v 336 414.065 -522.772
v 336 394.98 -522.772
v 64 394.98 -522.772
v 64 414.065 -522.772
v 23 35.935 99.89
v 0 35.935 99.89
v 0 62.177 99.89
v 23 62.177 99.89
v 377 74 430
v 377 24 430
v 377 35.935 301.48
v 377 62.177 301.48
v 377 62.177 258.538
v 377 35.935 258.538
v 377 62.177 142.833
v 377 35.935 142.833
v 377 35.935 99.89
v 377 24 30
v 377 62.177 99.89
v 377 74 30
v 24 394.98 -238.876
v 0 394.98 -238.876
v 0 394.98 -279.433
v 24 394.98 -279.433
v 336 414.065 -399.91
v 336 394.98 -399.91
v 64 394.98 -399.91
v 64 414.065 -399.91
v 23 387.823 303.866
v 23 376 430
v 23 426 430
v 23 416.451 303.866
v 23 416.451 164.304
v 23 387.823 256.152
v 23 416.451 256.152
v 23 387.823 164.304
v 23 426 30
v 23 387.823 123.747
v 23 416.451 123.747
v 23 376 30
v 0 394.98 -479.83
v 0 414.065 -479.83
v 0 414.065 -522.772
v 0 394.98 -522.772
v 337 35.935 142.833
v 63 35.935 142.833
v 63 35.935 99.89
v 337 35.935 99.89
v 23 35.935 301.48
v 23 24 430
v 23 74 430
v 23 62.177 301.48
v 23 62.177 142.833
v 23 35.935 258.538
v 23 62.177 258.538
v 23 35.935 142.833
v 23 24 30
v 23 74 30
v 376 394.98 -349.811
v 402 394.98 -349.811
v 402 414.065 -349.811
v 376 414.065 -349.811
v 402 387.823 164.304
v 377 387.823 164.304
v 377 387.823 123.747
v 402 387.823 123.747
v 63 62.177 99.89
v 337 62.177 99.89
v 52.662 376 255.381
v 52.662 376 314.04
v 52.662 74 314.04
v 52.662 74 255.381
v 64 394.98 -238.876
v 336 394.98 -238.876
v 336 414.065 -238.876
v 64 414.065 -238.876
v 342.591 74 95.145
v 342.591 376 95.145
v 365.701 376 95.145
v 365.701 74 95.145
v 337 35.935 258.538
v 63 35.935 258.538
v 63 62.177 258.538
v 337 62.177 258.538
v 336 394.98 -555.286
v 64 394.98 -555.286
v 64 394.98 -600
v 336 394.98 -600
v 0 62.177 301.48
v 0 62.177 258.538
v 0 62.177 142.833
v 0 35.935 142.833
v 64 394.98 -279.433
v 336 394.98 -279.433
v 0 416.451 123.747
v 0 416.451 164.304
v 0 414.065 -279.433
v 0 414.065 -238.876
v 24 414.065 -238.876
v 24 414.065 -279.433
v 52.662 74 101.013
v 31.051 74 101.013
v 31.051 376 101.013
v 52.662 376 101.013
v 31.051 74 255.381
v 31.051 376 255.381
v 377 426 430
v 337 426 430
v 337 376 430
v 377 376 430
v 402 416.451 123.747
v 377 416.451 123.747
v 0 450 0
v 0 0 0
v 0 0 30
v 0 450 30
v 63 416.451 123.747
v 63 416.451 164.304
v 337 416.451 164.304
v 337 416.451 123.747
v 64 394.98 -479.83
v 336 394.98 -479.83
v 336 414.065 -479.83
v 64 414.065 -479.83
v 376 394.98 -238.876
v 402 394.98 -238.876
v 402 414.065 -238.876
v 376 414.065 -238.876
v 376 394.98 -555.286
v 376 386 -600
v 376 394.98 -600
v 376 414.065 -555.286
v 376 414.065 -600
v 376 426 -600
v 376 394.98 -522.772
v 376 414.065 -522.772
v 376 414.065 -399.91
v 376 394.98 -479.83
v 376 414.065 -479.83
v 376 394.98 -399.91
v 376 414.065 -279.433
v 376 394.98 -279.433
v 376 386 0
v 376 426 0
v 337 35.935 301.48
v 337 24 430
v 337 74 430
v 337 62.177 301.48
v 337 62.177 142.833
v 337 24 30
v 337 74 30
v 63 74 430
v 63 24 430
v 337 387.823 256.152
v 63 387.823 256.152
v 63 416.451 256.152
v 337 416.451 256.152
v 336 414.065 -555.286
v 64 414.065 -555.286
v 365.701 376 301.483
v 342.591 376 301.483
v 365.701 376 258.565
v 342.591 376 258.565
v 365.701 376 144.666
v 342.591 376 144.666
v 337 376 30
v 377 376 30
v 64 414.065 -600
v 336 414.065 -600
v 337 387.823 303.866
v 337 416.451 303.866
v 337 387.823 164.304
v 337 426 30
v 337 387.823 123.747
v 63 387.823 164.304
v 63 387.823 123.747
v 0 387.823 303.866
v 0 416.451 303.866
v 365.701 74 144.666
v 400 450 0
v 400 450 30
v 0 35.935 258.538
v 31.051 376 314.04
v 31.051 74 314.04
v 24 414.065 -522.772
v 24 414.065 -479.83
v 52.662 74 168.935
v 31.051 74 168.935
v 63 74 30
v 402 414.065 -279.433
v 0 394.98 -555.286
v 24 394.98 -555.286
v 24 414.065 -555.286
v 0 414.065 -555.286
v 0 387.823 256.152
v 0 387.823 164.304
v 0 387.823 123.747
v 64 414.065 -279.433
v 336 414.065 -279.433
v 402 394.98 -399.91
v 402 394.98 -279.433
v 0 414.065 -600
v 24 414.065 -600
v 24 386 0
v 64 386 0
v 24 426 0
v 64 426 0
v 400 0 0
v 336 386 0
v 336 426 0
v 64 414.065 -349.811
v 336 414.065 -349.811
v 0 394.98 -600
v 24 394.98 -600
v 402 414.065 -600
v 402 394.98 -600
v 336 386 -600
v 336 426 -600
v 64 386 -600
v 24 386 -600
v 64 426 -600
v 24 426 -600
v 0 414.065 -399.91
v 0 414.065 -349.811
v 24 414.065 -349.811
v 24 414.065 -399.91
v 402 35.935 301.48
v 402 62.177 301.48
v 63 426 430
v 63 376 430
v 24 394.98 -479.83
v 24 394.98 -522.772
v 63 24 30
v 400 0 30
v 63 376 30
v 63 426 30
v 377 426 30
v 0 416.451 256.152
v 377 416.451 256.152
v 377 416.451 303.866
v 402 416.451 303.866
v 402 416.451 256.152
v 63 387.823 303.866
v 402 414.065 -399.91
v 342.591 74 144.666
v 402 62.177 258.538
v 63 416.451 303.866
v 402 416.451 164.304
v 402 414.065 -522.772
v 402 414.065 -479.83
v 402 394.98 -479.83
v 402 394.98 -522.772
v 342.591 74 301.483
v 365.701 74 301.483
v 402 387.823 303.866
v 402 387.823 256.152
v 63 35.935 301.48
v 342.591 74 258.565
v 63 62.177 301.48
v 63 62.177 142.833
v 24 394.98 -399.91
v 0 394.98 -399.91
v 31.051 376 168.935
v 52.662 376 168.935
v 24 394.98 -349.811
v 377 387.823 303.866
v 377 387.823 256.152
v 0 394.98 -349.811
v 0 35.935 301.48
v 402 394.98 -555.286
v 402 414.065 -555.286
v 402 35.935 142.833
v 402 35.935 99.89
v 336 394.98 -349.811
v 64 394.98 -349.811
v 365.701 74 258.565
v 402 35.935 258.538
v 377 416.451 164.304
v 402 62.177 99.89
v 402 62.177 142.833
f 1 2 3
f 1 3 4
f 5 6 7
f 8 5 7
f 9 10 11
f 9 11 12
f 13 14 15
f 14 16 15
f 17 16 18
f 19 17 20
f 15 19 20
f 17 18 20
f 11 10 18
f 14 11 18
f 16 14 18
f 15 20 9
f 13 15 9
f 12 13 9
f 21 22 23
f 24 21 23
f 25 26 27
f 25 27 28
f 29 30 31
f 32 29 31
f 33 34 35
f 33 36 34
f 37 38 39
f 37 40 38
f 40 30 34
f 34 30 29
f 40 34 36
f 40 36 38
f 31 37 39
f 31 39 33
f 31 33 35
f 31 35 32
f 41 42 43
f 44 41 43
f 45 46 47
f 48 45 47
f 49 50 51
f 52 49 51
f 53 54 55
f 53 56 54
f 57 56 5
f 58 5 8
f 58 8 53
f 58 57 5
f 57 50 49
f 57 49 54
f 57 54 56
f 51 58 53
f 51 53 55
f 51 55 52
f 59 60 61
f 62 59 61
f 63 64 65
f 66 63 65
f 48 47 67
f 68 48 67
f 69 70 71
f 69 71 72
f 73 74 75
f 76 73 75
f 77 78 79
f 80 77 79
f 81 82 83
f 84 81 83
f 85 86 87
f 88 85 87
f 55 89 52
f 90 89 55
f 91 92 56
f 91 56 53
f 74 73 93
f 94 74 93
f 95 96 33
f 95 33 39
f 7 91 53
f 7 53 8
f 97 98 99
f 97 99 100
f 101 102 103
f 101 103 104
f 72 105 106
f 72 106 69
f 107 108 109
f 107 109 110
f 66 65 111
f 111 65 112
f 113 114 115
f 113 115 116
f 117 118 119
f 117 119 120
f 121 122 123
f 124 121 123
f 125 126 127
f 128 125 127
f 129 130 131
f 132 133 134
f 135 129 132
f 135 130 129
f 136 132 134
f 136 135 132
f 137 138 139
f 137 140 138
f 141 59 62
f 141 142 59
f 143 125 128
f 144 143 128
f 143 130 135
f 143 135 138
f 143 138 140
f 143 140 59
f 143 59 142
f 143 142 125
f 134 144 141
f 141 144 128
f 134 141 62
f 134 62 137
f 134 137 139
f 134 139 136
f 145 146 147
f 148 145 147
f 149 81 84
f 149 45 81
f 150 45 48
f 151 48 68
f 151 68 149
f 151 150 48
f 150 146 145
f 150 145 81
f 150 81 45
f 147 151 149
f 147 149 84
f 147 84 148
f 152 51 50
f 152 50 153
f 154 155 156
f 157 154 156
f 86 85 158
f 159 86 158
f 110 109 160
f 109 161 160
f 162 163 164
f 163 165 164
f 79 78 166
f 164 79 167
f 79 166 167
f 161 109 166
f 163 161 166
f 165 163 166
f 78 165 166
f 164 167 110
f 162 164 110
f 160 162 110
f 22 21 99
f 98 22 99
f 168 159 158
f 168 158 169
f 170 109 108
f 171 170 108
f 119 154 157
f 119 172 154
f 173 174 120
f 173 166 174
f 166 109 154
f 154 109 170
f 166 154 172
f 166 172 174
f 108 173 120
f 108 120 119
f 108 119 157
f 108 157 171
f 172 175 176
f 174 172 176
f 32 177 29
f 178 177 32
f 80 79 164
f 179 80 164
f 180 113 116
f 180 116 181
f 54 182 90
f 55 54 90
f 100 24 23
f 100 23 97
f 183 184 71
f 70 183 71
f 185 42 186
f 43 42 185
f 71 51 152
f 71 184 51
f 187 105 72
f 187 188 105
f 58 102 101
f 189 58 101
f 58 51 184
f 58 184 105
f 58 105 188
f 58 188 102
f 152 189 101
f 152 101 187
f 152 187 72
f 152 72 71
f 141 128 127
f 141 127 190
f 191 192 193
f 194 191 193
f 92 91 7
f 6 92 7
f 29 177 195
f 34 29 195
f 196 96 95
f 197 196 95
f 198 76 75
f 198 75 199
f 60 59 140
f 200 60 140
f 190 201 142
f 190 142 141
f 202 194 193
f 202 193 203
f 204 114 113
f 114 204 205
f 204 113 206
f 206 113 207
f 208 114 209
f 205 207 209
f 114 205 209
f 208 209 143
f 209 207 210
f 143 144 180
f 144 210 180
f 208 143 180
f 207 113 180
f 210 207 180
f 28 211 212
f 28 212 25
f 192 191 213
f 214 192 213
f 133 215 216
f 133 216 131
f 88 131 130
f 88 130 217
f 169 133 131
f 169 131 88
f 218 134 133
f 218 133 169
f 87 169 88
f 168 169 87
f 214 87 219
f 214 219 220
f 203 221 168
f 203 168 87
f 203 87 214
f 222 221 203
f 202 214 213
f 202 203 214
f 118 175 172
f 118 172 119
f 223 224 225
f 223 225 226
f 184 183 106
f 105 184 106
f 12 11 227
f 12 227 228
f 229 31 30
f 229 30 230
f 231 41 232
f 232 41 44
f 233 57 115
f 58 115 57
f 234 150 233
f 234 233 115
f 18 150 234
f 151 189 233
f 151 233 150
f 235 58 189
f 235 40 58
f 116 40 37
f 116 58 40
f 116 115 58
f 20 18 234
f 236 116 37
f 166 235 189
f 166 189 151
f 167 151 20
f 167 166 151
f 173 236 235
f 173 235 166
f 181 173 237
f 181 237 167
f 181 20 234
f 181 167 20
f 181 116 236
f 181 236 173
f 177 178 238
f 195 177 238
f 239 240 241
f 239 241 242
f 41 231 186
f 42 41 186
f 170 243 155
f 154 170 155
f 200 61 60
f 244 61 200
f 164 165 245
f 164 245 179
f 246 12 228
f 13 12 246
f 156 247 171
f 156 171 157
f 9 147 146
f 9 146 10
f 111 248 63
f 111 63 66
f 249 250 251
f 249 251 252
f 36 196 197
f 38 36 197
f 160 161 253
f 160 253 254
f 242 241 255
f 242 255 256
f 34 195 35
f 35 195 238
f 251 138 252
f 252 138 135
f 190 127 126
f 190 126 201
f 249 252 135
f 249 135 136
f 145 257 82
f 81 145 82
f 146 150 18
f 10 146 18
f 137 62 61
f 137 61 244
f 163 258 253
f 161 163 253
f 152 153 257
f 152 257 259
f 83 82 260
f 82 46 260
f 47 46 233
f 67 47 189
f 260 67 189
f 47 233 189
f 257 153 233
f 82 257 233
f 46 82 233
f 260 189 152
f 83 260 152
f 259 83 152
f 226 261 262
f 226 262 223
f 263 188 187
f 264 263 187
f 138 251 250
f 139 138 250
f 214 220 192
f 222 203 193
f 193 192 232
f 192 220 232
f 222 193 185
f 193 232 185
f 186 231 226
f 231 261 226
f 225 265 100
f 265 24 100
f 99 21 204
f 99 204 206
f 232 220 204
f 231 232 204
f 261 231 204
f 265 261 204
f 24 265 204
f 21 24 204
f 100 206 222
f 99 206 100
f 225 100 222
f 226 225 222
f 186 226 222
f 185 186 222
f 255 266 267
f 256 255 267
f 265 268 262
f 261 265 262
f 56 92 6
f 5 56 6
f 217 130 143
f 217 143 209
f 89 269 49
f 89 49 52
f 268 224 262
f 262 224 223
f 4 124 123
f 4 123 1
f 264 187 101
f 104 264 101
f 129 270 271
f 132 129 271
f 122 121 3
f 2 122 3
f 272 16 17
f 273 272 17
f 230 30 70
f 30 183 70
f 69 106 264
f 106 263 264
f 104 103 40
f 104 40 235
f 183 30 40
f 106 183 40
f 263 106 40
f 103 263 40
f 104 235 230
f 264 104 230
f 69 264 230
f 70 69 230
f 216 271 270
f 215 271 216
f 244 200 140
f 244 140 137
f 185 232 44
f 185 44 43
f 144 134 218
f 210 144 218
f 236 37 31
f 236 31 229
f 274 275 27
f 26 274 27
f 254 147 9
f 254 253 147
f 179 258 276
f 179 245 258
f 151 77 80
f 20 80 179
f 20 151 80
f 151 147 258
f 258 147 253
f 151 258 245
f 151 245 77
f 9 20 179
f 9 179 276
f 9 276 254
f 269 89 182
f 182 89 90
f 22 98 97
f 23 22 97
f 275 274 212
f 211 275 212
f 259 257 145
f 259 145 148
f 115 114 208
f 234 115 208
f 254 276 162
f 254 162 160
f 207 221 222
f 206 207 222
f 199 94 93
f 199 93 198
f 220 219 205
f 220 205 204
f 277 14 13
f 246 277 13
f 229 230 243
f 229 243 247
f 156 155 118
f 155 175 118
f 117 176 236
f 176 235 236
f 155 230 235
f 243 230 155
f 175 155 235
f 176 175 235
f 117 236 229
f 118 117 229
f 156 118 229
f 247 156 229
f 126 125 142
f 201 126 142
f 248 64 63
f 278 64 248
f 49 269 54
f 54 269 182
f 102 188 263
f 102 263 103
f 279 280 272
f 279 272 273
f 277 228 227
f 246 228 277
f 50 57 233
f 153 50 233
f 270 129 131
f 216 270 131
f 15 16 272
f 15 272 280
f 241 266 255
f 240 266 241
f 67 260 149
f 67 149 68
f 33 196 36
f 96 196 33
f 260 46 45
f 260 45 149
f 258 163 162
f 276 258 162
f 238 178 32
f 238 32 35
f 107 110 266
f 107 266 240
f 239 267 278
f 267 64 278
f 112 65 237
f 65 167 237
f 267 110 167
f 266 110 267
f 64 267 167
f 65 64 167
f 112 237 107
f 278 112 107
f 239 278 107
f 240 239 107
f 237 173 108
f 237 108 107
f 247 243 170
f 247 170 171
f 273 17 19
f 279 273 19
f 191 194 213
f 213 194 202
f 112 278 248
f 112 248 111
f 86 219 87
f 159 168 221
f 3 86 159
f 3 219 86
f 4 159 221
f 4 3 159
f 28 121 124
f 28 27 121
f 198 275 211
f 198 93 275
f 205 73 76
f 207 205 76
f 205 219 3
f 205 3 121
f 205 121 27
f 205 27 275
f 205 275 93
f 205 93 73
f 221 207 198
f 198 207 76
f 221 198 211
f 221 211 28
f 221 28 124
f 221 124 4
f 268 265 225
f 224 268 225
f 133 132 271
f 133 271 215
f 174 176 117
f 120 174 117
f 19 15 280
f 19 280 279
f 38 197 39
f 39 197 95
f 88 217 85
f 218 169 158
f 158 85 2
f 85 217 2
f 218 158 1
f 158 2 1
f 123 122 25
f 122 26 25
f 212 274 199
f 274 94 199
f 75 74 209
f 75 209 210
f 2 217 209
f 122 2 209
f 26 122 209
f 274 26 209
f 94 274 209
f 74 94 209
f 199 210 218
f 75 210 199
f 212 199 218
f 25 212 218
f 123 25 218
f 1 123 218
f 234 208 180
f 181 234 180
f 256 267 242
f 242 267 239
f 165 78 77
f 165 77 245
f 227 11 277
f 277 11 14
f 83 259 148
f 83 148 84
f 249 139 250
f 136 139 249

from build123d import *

# Parameters (mm, degrees)
SKETCH2_W                       = 400
SKETCH2_H                       = 450
BOSS_EXTRUDE1_DEPTH             = 30
SKETCH3_W                       = 40
SKETCH3_H                       = 50
BOSS_EXTRUDE2_DEPTH             = 400
SKETCH4_W                       = 40
SKETCH4_H                       = 40
BOSS_EXTRUDE3_DEPTH             = 600
SKETCH5_W                       = 40.556580032
SKETCH5_H                       = 28.62817414
SKETCH5_W_2                     = 47.713623567
BOSS_EXTRUDE4_DEPTH             = 402
SKETCH6_W                       = 42.94226121
SKETCH6_H                       = 26.242492962
SKETCH6_W_2                     = 42.942261211
BOSS_EXTRUDE5_DEPTH             = 402
SKETCH7_W                       = 40.556580032
SKETCH7_H                       = 19.085449427
SKETCH7_W_2                     = 50.099304746
SKETCH7_W_3                     = 42.94226121
SKETCH7_W_4                     = 44.71367334
BOSS_EXTRUDE6_DEPTH             = 402
BOSS_EXTRUDE7_REACH             = 816.236
SKETCH8_W                       = 21.611464792
SKETCH8_H                       = 67.92174649
SKETCH8_H_2                     = 58.65969015
BOSS_EXTRUDE7_DIRECTION_2_DEPTH = 2
BOSS_EXTRUDE8_REACH             = 816.236
SKETCH9_W                       = 23.109912939
SKETCH9_H                       = 42.918409744
SKETCH9_H_2                     = 49.521242012


with BuildPart() as part:
    # Sketch2 → Boss-Extrude1 (new body)
    with BuildSketch(Plane.XY):
        with Locations((200, 225)):
            Rectangle(SKETCH2_W, SKETCH2_H)
    extrude(amount=BOSS_EXTRUDE1_DEPTH)

    # Sketch3 → Boss-Extrude2 (add)
    with BuildSketch(Plane.XY.offset(30)):
        with Locations((43, 401)):
            Rectangle(SKETCH3_W, SKETCH3_H)
        with Locations((357, 401)):
            Rectangle(SKETCH3_W, SKETCH3_H)
        with Locations((357, 49)):
            Rectangle(SKETCH3_W, SKETCH3_H)
        with Locations((43, 49)):
            Rectangle(SKETCH3_W, SKETCH3_H)
    extrude(amount=BOSS_EXTRUDE2_DEPTH)

    # Sketch4 → Boss-Extrude3 (add)
    with BuildSketch(Plane(origin=(0, 0, 0), x_dir=(-1, 0, 0), z_dir=(0, 0, -1))):
        with Locations((-356, 406)):
            Rectangle(SKETCH4_W, SKETCH4_H)
        with Locations((-44, 406)):
            Rectangle(SKETCH4_W, SKETCH4_H)
    extrude(amount=BOSS_EXTRUDE3_DEPTH)

    # Sketch5 → Boss-Extrude4 (add)
    with BuildSketch(Plane(origin=(0, 0, 0), x_dir=(0, 0, -1), z_dir=(1, 0, 0))):
        with Locations((-144.025393122, 402.136827493)):
            Rectangle(SKETCH5_W, SKETCH5_H)
        with Locations((-280.009220289, 402.136827493)):
            Rectangle(SKETCH5_W_2, SKETCH5_H)
    extrude(amount=BOSS_EXTRUDE4_DEPTH)

    # Sketch6 → Boss-Extrude5 (add)
    with BuildSketch(Plane(origin=(0, 0, 0), x_dir=(0, 0, -1), z_dir=(1, 0, 0))):
        with Locations((-280.009220288, 49.056013096)):
            Rectangle(SKETCH6_W, SKETCH6_H)
        with Locations((-121.361421928, 49.056013096)):
            Rectangle(SKETCH6_W_2, SKETCH6_H)
    extrude(amount=BOSS_EXTRUDE5_DEPTH)

    # Sketch7 → Boss-Extrude6 (add)
    with BuildSketch(Plane(origin=(0, 0, 0), x_dir=(0, 0, -1), z_dir=(1, 0, 0))):
        with Locations((259.15472602, 404.522508672)):
            Rectangle(SKETCH7_W, SKETCH7_H)
        with Locations((374.86026317, 404.522508672)):
            Rectangle(SKETCH7_W_2, SKETCH7_H)
        with Locations((501.301365623, 404.522508672)):
            Rectangle(SKETCH7_W_3, SKETCH7_H)
        with Locations((577.64316333, 404.522508672)):
            Rectangle(SKETCH7_W_4, SKETCH7_H)
    extrude(amount=BOSS_EXTRUDE6_DEPTH)

    # Sketch8 → Boss-Extrude7 (add, up to next)
    with BuildSketch(Plane(origin=(0, 74, 0), x_dir=(1, 0, 0), z_dir=(0, 1, 0)), mode=Mode.PRIVATE) as boss_extrude7_sk1:
        with Locations((41.856325516, -134.973838063)):
            Rectangle(SKETCH8_W, SKETCH8_H)
    boss_extrude7_tool1 = extrude(boss_extrude7_sk1.sketch, amount=BOSS_EXTRUDE7_REACH, mode=Mode.PRIVATE) - part.part
    # Sketch8 → Boss-Extrude7 (add, up to next)
    with BuildSketch(Plane(origin=(0, 74, 0), x_dir=(1, 0, 0), z_dir=(0, 1, 0)), mode=Mode.PRIVATE) as boss_extrude7_sk2:
        with Locations((41.856325516, -284.710415551)):
            Rectangle(SKETCH8_W, SKETCH8_H_2)
    boss_extrude7_tool2 = extrude(boss_extrude7_sk2.sketch, amount=BOSS_EXTRUDE7_REACH, mode=Mode.PRIVATE) - part.part
    add(boss_extrude7_tool1.solids().sort_by_distance((41.856326, 74, 134.973838))[0])
    add(boss_extrude7_tool2.solids().sort_by_distance((41.856326, 74, 284.710416))[0])

    # Sketch8 → Boss-Extrude7 direction 2 (add)
    with BuildSketch(Plane(origin=(0, 74, 0), x_dir=(1, 0, 0), z_dir=(0, 1, 0))):
        with Locations((41.856325516, -134.973838063)):
            Rectangle(SKETCH8_W, SKETCH8_H)
        with Locations((41.856325516, -284.710415551)):
            Rectangle(SKETCH8_W, SKETCH8_H_2)
    extrude(amount=-BOSS_EXTRUDE7_DIRECTION_2_DEPTH)

    # Sketch9 → Boss-Extrude8 (add, up to next)
    with BuildSketch(Plane.XZ.offset(-376), mode=Mode.PRIVATE) as boss_extrude8_sk1:
        with Locations((354.146322372, 280.024195097)):
            Rectangle(SKETCH9_W, SKETCH9_H)
    boss_extrude8_tool1 = extrude(boss_extrude8_sk1.sketch, amount=BOSS_EXTRUDE8_REACH, mode=Mode.PRIVATE) - part.part
    # Sketch9 → Boss-Extrude8 (add, up to next)
    with BuildSketch(Plane.XZ.offset(-376), mode=Mode.PRIVATE) as boss_extrude8_sk2:
        with Locations((354.146322372, 119.905512592)):
            Rectangle(SKETCH9_W, SKETCH9_H_2)
    boss_extrude8_tool2 = extrude(boss_extrude8_sk2.sketch, amount=BOSS_EXTRUDE8_REACH, mode=Mode.PRIVATE) - part.part
    add(boss_extrude8_tool1.solids().sort_by_distance((354.146322, 376, 280.024195))[0])
    add(boss_extrude8_tool2.solids().sort_by_distance((354.146322, 376, 119.905513))[0])


solid = part.part
